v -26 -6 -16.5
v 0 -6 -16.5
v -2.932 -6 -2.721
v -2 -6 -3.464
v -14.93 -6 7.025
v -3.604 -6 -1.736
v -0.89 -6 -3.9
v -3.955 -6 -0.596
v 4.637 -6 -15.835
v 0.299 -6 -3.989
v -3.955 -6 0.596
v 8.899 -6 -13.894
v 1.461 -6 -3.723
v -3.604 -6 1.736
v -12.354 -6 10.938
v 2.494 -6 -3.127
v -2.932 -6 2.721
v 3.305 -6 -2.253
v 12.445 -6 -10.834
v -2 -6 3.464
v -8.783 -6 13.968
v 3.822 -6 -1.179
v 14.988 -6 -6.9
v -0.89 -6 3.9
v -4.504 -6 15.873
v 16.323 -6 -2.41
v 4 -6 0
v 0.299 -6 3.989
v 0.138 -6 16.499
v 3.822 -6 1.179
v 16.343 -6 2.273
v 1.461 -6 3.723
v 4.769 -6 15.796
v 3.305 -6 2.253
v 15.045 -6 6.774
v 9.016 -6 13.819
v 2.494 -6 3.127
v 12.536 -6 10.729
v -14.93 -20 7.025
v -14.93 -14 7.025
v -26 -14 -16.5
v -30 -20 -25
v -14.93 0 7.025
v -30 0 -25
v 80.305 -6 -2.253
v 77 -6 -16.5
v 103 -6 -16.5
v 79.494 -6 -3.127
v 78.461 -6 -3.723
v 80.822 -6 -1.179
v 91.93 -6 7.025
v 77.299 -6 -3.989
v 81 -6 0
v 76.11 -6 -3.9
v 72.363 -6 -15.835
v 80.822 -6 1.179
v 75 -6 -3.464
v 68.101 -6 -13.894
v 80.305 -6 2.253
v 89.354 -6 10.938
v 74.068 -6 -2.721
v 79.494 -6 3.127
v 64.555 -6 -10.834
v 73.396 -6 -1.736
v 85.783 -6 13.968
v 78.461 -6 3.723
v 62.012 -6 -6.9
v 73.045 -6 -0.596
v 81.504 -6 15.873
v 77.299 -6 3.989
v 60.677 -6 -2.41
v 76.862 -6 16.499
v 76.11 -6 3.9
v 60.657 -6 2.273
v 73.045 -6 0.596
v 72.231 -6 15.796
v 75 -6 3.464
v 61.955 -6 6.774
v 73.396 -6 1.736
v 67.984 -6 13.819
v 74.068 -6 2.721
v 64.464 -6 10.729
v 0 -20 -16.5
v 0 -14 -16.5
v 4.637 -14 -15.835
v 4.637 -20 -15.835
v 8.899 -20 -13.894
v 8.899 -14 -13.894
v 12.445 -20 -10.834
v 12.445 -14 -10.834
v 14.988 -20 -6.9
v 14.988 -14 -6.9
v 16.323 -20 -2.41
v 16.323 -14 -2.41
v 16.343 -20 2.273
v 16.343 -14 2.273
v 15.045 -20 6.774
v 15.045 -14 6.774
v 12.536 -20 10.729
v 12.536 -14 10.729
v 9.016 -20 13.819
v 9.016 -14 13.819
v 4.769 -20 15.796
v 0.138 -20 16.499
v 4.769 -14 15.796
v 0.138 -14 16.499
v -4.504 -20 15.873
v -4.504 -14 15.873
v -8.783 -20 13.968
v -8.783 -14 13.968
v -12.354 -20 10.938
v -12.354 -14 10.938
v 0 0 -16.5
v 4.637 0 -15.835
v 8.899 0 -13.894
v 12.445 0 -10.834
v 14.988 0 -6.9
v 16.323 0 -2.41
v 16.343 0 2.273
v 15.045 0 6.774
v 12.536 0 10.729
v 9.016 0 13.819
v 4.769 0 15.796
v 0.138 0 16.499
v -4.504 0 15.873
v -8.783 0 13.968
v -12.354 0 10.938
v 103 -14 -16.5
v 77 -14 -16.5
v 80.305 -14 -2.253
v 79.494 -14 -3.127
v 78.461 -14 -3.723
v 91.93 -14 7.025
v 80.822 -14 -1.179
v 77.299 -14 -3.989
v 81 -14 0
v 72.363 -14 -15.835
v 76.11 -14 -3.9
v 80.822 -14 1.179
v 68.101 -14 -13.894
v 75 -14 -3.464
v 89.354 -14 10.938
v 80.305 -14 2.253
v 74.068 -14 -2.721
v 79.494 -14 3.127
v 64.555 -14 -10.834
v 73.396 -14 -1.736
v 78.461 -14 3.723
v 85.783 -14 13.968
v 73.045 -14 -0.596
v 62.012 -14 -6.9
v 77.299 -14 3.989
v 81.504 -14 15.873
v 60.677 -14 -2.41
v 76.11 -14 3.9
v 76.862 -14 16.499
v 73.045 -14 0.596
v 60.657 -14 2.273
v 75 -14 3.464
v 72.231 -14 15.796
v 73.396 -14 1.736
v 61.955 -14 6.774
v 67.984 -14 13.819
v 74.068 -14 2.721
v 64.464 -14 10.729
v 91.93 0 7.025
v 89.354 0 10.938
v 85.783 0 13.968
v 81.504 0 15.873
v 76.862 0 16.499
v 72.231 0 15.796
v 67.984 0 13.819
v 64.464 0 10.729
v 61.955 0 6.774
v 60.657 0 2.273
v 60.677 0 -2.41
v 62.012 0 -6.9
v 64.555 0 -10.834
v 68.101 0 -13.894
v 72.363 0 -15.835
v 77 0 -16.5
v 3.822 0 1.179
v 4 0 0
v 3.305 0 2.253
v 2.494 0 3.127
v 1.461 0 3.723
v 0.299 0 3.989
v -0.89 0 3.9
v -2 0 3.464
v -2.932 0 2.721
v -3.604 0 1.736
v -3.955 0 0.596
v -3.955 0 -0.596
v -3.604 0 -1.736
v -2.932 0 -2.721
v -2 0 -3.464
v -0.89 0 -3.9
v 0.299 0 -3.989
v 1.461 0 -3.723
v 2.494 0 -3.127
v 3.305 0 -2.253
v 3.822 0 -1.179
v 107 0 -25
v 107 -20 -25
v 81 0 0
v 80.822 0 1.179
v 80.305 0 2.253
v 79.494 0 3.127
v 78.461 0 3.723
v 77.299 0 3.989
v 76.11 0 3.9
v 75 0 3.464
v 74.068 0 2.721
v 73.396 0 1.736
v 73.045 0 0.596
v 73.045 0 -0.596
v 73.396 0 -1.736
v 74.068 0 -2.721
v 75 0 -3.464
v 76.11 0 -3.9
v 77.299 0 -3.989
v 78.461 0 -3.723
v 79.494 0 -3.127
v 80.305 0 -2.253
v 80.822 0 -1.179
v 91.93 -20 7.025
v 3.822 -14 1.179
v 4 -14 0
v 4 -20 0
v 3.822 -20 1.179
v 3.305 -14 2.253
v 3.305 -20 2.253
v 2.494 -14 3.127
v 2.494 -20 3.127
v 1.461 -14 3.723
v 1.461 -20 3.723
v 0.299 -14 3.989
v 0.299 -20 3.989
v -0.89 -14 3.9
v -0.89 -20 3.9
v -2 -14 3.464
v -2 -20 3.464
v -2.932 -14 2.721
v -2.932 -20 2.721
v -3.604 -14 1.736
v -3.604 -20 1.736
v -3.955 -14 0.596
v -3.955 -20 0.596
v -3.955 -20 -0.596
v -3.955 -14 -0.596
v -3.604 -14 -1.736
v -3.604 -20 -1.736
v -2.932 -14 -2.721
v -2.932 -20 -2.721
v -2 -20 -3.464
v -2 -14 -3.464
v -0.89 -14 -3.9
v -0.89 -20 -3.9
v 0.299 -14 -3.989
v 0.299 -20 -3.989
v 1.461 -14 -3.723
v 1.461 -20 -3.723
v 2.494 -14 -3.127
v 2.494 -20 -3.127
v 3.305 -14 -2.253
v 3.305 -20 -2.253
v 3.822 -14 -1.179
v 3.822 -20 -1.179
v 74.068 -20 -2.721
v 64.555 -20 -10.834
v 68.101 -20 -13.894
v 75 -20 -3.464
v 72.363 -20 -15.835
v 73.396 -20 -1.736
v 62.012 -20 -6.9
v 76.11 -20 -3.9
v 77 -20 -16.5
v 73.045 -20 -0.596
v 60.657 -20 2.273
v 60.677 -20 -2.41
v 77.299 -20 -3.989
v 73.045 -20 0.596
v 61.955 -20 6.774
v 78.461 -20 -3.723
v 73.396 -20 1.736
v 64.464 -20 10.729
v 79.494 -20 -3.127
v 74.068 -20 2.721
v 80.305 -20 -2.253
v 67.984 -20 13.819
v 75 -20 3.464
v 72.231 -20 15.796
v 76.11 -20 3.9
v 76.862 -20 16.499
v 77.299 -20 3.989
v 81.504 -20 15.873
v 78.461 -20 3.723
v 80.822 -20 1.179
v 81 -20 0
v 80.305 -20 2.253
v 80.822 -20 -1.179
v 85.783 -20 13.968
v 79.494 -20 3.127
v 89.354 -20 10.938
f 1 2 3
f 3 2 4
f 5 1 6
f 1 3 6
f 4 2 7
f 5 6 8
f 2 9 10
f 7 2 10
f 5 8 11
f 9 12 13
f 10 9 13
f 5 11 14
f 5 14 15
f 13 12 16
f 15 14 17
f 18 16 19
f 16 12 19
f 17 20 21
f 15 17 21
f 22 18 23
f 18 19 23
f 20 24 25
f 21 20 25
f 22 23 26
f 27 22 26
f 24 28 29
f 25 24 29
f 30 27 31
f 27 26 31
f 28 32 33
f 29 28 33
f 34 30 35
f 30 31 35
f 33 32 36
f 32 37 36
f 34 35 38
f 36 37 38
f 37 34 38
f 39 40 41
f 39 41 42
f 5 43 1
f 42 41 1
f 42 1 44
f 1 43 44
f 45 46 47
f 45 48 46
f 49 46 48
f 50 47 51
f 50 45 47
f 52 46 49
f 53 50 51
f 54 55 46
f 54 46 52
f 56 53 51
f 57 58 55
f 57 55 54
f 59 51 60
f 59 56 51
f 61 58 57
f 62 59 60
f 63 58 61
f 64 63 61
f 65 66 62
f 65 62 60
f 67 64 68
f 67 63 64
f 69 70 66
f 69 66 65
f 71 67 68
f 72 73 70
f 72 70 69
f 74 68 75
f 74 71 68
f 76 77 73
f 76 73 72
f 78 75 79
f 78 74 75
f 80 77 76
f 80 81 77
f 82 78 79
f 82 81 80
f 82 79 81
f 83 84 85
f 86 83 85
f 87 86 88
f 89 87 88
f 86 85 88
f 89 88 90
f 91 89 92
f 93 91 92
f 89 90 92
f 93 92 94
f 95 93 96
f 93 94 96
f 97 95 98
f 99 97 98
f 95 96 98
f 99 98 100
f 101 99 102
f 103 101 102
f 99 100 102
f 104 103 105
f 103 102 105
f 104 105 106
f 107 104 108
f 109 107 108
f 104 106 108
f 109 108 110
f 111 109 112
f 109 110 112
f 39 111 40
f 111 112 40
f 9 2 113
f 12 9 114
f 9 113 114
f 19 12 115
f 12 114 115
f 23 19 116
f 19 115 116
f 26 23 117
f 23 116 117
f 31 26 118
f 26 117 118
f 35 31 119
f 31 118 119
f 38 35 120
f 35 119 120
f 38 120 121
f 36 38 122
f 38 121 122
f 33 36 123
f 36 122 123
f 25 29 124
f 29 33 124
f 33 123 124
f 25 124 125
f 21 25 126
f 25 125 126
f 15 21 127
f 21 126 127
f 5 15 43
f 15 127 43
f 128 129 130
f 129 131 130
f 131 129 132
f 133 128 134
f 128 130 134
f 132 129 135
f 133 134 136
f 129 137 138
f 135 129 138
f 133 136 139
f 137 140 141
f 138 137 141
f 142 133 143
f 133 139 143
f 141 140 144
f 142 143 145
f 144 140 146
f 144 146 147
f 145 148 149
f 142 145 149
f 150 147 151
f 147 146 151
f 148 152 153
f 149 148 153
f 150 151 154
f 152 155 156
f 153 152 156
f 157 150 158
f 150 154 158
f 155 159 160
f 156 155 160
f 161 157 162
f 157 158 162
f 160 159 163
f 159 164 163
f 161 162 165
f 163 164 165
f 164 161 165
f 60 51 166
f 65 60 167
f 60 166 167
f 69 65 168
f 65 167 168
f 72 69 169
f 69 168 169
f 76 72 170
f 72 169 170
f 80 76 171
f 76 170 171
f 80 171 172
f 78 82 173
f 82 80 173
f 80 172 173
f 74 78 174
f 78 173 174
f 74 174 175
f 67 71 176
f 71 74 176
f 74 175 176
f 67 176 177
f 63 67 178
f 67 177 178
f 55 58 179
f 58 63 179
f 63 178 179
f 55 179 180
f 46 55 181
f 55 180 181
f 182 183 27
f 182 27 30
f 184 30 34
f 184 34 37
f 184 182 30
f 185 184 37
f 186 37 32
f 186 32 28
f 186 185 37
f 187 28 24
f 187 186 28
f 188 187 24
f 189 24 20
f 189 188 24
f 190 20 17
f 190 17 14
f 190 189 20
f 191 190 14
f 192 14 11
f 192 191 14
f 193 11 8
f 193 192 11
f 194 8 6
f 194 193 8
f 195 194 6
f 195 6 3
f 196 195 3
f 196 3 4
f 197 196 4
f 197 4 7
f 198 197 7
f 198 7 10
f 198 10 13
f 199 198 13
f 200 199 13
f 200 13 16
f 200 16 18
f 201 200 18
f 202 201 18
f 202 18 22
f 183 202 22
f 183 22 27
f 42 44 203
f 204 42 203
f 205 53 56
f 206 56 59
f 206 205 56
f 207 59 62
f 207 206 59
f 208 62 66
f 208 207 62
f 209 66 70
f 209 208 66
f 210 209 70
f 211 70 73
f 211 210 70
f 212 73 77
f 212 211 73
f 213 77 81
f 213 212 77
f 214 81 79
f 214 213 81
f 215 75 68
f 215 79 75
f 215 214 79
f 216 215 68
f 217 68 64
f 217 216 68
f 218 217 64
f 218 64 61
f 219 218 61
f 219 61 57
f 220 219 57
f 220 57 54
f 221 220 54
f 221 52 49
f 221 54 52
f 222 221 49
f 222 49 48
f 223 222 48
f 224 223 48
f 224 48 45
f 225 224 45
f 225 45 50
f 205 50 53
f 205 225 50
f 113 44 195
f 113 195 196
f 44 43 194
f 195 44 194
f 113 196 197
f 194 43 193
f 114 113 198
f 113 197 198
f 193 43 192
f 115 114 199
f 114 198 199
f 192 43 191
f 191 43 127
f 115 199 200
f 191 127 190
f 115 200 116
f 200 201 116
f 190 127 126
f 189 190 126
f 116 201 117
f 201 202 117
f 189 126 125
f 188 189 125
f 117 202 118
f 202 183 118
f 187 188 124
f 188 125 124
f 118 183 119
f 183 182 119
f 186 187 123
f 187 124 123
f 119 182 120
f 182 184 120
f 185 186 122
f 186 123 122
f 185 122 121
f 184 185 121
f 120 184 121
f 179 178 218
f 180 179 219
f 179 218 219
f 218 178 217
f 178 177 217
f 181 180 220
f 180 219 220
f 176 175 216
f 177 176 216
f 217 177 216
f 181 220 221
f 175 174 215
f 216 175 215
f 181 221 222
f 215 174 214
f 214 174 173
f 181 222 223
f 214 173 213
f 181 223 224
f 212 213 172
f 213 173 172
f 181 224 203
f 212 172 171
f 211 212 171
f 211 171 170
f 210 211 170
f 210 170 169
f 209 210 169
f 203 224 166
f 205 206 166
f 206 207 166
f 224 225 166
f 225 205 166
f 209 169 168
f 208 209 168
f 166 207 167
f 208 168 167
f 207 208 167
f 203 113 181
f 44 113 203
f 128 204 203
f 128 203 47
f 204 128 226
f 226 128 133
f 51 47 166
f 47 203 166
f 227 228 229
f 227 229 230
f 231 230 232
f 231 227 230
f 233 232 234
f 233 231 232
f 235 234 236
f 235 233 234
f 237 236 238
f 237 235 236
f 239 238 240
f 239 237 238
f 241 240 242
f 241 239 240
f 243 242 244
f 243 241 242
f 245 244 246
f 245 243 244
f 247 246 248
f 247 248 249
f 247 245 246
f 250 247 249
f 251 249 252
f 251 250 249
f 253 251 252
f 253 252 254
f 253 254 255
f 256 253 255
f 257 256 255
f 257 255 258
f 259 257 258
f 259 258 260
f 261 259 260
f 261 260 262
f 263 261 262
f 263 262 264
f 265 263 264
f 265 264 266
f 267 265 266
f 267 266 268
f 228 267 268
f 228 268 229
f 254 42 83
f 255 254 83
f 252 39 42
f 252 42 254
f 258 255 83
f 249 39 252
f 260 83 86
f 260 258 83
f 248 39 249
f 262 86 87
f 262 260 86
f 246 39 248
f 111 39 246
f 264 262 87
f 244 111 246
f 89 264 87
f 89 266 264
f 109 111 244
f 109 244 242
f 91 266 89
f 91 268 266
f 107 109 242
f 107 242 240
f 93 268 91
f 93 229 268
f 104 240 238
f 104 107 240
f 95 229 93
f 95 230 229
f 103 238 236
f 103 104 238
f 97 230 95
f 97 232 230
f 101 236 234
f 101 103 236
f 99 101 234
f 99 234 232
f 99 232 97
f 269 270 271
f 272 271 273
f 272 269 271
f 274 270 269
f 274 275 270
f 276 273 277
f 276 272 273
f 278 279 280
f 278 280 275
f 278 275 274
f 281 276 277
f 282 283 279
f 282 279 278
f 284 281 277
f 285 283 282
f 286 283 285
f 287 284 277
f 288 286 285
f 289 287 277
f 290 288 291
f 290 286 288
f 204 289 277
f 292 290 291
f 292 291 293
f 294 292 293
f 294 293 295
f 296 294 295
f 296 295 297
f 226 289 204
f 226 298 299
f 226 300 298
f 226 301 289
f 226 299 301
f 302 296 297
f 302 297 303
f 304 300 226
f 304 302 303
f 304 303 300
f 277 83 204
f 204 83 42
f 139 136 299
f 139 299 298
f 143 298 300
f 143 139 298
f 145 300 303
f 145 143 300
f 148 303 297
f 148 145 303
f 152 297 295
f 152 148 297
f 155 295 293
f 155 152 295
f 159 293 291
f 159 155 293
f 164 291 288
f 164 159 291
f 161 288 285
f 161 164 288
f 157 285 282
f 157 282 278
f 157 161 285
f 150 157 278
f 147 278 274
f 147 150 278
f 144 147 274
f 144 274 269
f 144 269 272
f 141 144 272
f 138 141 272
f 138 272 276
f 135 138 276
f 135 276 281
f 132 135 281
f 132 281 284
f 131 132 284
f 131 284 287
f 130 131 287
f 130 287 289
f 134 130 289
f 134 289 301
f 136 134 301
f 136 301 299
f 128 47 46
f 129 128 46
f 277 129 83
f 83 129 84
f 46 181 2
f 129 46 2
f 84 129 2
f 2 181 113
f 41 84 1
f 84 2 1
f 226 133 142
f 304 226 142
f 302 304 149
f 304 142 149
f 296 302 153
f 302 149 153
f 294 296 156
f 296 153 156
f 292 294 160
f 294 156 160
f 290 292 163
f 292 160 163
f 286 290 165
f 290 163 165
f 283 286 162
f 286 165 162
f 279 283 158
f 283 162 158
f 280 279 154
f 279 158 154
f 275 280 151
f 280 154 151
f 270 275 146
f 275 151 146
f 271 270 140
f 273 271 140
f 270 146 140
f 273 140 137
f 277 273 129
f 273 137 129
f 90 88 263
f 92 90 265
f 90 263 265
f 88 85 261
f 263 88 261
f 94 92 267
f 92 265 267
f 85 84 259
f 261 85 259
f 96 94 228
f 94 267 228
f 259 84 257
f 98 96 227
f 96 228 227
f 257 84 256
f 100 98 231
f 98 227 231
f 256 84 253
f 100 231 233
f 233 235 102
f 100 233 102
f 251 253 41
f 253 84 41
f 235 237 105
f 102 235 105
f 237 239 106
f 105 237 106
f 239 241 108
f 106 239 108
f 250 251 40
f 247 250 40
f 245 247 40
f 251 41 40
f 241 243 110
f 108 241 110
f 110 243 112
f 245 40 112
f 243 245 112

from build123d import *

# Parameters (mm, degrees)
F0_R          = 4
F1_DEPTH      = 20
F2_W          = 8
F2_H          = 60.2939470698
F3_DEPTH      = 128.3
F3_DEPTH_BACK = 41.8


with BuildPart() as f1:
    # F0 (on Front) → F1 (new body)
    with BuildSketch(Plane.XZ):
        with BuildLine():
            Line((77, -16.5), (0, -16.5))
            ThreePointArc((0, -16.5), (13.9314518969, 8.8410773125), (-14.9295810055, 7.0254972066))
            Line((-14.9295810055, 7.0254972066), (-30, -25))
            Line((-30, -25), (107, -25))
            Line((107, -25), (91.9295810055, 7.0254972066))
            ThreePointArc((91.9295810055, 7.0254972066), (63.0685481031, 8.8410773125), (77, -16.5))
        make_face()
        Circle(F0_R, mode=Mode.SUBTRACT)
        with Locations((77, 0)):
            Circle(F0_R, mode=Mode.SUBTRACT)
    extrude(amount=F1_DEPTH)

    # F2 (on Right) → F3 (cut, two sides)
    with BuildSketch(Plane.YZ) as f3_sk:
        with Locations((-10, 13.6469735349)):
            Rectangle(F2_W, F2_H)
    extrude(amount=F3_DEPTH, mode=Mode.SUBTRACT)
    extrude(f3_sk.sketch, amount=-F3_DEPTH_BACK, mode=Mode.SUBTRACT)


solid = f1.part
